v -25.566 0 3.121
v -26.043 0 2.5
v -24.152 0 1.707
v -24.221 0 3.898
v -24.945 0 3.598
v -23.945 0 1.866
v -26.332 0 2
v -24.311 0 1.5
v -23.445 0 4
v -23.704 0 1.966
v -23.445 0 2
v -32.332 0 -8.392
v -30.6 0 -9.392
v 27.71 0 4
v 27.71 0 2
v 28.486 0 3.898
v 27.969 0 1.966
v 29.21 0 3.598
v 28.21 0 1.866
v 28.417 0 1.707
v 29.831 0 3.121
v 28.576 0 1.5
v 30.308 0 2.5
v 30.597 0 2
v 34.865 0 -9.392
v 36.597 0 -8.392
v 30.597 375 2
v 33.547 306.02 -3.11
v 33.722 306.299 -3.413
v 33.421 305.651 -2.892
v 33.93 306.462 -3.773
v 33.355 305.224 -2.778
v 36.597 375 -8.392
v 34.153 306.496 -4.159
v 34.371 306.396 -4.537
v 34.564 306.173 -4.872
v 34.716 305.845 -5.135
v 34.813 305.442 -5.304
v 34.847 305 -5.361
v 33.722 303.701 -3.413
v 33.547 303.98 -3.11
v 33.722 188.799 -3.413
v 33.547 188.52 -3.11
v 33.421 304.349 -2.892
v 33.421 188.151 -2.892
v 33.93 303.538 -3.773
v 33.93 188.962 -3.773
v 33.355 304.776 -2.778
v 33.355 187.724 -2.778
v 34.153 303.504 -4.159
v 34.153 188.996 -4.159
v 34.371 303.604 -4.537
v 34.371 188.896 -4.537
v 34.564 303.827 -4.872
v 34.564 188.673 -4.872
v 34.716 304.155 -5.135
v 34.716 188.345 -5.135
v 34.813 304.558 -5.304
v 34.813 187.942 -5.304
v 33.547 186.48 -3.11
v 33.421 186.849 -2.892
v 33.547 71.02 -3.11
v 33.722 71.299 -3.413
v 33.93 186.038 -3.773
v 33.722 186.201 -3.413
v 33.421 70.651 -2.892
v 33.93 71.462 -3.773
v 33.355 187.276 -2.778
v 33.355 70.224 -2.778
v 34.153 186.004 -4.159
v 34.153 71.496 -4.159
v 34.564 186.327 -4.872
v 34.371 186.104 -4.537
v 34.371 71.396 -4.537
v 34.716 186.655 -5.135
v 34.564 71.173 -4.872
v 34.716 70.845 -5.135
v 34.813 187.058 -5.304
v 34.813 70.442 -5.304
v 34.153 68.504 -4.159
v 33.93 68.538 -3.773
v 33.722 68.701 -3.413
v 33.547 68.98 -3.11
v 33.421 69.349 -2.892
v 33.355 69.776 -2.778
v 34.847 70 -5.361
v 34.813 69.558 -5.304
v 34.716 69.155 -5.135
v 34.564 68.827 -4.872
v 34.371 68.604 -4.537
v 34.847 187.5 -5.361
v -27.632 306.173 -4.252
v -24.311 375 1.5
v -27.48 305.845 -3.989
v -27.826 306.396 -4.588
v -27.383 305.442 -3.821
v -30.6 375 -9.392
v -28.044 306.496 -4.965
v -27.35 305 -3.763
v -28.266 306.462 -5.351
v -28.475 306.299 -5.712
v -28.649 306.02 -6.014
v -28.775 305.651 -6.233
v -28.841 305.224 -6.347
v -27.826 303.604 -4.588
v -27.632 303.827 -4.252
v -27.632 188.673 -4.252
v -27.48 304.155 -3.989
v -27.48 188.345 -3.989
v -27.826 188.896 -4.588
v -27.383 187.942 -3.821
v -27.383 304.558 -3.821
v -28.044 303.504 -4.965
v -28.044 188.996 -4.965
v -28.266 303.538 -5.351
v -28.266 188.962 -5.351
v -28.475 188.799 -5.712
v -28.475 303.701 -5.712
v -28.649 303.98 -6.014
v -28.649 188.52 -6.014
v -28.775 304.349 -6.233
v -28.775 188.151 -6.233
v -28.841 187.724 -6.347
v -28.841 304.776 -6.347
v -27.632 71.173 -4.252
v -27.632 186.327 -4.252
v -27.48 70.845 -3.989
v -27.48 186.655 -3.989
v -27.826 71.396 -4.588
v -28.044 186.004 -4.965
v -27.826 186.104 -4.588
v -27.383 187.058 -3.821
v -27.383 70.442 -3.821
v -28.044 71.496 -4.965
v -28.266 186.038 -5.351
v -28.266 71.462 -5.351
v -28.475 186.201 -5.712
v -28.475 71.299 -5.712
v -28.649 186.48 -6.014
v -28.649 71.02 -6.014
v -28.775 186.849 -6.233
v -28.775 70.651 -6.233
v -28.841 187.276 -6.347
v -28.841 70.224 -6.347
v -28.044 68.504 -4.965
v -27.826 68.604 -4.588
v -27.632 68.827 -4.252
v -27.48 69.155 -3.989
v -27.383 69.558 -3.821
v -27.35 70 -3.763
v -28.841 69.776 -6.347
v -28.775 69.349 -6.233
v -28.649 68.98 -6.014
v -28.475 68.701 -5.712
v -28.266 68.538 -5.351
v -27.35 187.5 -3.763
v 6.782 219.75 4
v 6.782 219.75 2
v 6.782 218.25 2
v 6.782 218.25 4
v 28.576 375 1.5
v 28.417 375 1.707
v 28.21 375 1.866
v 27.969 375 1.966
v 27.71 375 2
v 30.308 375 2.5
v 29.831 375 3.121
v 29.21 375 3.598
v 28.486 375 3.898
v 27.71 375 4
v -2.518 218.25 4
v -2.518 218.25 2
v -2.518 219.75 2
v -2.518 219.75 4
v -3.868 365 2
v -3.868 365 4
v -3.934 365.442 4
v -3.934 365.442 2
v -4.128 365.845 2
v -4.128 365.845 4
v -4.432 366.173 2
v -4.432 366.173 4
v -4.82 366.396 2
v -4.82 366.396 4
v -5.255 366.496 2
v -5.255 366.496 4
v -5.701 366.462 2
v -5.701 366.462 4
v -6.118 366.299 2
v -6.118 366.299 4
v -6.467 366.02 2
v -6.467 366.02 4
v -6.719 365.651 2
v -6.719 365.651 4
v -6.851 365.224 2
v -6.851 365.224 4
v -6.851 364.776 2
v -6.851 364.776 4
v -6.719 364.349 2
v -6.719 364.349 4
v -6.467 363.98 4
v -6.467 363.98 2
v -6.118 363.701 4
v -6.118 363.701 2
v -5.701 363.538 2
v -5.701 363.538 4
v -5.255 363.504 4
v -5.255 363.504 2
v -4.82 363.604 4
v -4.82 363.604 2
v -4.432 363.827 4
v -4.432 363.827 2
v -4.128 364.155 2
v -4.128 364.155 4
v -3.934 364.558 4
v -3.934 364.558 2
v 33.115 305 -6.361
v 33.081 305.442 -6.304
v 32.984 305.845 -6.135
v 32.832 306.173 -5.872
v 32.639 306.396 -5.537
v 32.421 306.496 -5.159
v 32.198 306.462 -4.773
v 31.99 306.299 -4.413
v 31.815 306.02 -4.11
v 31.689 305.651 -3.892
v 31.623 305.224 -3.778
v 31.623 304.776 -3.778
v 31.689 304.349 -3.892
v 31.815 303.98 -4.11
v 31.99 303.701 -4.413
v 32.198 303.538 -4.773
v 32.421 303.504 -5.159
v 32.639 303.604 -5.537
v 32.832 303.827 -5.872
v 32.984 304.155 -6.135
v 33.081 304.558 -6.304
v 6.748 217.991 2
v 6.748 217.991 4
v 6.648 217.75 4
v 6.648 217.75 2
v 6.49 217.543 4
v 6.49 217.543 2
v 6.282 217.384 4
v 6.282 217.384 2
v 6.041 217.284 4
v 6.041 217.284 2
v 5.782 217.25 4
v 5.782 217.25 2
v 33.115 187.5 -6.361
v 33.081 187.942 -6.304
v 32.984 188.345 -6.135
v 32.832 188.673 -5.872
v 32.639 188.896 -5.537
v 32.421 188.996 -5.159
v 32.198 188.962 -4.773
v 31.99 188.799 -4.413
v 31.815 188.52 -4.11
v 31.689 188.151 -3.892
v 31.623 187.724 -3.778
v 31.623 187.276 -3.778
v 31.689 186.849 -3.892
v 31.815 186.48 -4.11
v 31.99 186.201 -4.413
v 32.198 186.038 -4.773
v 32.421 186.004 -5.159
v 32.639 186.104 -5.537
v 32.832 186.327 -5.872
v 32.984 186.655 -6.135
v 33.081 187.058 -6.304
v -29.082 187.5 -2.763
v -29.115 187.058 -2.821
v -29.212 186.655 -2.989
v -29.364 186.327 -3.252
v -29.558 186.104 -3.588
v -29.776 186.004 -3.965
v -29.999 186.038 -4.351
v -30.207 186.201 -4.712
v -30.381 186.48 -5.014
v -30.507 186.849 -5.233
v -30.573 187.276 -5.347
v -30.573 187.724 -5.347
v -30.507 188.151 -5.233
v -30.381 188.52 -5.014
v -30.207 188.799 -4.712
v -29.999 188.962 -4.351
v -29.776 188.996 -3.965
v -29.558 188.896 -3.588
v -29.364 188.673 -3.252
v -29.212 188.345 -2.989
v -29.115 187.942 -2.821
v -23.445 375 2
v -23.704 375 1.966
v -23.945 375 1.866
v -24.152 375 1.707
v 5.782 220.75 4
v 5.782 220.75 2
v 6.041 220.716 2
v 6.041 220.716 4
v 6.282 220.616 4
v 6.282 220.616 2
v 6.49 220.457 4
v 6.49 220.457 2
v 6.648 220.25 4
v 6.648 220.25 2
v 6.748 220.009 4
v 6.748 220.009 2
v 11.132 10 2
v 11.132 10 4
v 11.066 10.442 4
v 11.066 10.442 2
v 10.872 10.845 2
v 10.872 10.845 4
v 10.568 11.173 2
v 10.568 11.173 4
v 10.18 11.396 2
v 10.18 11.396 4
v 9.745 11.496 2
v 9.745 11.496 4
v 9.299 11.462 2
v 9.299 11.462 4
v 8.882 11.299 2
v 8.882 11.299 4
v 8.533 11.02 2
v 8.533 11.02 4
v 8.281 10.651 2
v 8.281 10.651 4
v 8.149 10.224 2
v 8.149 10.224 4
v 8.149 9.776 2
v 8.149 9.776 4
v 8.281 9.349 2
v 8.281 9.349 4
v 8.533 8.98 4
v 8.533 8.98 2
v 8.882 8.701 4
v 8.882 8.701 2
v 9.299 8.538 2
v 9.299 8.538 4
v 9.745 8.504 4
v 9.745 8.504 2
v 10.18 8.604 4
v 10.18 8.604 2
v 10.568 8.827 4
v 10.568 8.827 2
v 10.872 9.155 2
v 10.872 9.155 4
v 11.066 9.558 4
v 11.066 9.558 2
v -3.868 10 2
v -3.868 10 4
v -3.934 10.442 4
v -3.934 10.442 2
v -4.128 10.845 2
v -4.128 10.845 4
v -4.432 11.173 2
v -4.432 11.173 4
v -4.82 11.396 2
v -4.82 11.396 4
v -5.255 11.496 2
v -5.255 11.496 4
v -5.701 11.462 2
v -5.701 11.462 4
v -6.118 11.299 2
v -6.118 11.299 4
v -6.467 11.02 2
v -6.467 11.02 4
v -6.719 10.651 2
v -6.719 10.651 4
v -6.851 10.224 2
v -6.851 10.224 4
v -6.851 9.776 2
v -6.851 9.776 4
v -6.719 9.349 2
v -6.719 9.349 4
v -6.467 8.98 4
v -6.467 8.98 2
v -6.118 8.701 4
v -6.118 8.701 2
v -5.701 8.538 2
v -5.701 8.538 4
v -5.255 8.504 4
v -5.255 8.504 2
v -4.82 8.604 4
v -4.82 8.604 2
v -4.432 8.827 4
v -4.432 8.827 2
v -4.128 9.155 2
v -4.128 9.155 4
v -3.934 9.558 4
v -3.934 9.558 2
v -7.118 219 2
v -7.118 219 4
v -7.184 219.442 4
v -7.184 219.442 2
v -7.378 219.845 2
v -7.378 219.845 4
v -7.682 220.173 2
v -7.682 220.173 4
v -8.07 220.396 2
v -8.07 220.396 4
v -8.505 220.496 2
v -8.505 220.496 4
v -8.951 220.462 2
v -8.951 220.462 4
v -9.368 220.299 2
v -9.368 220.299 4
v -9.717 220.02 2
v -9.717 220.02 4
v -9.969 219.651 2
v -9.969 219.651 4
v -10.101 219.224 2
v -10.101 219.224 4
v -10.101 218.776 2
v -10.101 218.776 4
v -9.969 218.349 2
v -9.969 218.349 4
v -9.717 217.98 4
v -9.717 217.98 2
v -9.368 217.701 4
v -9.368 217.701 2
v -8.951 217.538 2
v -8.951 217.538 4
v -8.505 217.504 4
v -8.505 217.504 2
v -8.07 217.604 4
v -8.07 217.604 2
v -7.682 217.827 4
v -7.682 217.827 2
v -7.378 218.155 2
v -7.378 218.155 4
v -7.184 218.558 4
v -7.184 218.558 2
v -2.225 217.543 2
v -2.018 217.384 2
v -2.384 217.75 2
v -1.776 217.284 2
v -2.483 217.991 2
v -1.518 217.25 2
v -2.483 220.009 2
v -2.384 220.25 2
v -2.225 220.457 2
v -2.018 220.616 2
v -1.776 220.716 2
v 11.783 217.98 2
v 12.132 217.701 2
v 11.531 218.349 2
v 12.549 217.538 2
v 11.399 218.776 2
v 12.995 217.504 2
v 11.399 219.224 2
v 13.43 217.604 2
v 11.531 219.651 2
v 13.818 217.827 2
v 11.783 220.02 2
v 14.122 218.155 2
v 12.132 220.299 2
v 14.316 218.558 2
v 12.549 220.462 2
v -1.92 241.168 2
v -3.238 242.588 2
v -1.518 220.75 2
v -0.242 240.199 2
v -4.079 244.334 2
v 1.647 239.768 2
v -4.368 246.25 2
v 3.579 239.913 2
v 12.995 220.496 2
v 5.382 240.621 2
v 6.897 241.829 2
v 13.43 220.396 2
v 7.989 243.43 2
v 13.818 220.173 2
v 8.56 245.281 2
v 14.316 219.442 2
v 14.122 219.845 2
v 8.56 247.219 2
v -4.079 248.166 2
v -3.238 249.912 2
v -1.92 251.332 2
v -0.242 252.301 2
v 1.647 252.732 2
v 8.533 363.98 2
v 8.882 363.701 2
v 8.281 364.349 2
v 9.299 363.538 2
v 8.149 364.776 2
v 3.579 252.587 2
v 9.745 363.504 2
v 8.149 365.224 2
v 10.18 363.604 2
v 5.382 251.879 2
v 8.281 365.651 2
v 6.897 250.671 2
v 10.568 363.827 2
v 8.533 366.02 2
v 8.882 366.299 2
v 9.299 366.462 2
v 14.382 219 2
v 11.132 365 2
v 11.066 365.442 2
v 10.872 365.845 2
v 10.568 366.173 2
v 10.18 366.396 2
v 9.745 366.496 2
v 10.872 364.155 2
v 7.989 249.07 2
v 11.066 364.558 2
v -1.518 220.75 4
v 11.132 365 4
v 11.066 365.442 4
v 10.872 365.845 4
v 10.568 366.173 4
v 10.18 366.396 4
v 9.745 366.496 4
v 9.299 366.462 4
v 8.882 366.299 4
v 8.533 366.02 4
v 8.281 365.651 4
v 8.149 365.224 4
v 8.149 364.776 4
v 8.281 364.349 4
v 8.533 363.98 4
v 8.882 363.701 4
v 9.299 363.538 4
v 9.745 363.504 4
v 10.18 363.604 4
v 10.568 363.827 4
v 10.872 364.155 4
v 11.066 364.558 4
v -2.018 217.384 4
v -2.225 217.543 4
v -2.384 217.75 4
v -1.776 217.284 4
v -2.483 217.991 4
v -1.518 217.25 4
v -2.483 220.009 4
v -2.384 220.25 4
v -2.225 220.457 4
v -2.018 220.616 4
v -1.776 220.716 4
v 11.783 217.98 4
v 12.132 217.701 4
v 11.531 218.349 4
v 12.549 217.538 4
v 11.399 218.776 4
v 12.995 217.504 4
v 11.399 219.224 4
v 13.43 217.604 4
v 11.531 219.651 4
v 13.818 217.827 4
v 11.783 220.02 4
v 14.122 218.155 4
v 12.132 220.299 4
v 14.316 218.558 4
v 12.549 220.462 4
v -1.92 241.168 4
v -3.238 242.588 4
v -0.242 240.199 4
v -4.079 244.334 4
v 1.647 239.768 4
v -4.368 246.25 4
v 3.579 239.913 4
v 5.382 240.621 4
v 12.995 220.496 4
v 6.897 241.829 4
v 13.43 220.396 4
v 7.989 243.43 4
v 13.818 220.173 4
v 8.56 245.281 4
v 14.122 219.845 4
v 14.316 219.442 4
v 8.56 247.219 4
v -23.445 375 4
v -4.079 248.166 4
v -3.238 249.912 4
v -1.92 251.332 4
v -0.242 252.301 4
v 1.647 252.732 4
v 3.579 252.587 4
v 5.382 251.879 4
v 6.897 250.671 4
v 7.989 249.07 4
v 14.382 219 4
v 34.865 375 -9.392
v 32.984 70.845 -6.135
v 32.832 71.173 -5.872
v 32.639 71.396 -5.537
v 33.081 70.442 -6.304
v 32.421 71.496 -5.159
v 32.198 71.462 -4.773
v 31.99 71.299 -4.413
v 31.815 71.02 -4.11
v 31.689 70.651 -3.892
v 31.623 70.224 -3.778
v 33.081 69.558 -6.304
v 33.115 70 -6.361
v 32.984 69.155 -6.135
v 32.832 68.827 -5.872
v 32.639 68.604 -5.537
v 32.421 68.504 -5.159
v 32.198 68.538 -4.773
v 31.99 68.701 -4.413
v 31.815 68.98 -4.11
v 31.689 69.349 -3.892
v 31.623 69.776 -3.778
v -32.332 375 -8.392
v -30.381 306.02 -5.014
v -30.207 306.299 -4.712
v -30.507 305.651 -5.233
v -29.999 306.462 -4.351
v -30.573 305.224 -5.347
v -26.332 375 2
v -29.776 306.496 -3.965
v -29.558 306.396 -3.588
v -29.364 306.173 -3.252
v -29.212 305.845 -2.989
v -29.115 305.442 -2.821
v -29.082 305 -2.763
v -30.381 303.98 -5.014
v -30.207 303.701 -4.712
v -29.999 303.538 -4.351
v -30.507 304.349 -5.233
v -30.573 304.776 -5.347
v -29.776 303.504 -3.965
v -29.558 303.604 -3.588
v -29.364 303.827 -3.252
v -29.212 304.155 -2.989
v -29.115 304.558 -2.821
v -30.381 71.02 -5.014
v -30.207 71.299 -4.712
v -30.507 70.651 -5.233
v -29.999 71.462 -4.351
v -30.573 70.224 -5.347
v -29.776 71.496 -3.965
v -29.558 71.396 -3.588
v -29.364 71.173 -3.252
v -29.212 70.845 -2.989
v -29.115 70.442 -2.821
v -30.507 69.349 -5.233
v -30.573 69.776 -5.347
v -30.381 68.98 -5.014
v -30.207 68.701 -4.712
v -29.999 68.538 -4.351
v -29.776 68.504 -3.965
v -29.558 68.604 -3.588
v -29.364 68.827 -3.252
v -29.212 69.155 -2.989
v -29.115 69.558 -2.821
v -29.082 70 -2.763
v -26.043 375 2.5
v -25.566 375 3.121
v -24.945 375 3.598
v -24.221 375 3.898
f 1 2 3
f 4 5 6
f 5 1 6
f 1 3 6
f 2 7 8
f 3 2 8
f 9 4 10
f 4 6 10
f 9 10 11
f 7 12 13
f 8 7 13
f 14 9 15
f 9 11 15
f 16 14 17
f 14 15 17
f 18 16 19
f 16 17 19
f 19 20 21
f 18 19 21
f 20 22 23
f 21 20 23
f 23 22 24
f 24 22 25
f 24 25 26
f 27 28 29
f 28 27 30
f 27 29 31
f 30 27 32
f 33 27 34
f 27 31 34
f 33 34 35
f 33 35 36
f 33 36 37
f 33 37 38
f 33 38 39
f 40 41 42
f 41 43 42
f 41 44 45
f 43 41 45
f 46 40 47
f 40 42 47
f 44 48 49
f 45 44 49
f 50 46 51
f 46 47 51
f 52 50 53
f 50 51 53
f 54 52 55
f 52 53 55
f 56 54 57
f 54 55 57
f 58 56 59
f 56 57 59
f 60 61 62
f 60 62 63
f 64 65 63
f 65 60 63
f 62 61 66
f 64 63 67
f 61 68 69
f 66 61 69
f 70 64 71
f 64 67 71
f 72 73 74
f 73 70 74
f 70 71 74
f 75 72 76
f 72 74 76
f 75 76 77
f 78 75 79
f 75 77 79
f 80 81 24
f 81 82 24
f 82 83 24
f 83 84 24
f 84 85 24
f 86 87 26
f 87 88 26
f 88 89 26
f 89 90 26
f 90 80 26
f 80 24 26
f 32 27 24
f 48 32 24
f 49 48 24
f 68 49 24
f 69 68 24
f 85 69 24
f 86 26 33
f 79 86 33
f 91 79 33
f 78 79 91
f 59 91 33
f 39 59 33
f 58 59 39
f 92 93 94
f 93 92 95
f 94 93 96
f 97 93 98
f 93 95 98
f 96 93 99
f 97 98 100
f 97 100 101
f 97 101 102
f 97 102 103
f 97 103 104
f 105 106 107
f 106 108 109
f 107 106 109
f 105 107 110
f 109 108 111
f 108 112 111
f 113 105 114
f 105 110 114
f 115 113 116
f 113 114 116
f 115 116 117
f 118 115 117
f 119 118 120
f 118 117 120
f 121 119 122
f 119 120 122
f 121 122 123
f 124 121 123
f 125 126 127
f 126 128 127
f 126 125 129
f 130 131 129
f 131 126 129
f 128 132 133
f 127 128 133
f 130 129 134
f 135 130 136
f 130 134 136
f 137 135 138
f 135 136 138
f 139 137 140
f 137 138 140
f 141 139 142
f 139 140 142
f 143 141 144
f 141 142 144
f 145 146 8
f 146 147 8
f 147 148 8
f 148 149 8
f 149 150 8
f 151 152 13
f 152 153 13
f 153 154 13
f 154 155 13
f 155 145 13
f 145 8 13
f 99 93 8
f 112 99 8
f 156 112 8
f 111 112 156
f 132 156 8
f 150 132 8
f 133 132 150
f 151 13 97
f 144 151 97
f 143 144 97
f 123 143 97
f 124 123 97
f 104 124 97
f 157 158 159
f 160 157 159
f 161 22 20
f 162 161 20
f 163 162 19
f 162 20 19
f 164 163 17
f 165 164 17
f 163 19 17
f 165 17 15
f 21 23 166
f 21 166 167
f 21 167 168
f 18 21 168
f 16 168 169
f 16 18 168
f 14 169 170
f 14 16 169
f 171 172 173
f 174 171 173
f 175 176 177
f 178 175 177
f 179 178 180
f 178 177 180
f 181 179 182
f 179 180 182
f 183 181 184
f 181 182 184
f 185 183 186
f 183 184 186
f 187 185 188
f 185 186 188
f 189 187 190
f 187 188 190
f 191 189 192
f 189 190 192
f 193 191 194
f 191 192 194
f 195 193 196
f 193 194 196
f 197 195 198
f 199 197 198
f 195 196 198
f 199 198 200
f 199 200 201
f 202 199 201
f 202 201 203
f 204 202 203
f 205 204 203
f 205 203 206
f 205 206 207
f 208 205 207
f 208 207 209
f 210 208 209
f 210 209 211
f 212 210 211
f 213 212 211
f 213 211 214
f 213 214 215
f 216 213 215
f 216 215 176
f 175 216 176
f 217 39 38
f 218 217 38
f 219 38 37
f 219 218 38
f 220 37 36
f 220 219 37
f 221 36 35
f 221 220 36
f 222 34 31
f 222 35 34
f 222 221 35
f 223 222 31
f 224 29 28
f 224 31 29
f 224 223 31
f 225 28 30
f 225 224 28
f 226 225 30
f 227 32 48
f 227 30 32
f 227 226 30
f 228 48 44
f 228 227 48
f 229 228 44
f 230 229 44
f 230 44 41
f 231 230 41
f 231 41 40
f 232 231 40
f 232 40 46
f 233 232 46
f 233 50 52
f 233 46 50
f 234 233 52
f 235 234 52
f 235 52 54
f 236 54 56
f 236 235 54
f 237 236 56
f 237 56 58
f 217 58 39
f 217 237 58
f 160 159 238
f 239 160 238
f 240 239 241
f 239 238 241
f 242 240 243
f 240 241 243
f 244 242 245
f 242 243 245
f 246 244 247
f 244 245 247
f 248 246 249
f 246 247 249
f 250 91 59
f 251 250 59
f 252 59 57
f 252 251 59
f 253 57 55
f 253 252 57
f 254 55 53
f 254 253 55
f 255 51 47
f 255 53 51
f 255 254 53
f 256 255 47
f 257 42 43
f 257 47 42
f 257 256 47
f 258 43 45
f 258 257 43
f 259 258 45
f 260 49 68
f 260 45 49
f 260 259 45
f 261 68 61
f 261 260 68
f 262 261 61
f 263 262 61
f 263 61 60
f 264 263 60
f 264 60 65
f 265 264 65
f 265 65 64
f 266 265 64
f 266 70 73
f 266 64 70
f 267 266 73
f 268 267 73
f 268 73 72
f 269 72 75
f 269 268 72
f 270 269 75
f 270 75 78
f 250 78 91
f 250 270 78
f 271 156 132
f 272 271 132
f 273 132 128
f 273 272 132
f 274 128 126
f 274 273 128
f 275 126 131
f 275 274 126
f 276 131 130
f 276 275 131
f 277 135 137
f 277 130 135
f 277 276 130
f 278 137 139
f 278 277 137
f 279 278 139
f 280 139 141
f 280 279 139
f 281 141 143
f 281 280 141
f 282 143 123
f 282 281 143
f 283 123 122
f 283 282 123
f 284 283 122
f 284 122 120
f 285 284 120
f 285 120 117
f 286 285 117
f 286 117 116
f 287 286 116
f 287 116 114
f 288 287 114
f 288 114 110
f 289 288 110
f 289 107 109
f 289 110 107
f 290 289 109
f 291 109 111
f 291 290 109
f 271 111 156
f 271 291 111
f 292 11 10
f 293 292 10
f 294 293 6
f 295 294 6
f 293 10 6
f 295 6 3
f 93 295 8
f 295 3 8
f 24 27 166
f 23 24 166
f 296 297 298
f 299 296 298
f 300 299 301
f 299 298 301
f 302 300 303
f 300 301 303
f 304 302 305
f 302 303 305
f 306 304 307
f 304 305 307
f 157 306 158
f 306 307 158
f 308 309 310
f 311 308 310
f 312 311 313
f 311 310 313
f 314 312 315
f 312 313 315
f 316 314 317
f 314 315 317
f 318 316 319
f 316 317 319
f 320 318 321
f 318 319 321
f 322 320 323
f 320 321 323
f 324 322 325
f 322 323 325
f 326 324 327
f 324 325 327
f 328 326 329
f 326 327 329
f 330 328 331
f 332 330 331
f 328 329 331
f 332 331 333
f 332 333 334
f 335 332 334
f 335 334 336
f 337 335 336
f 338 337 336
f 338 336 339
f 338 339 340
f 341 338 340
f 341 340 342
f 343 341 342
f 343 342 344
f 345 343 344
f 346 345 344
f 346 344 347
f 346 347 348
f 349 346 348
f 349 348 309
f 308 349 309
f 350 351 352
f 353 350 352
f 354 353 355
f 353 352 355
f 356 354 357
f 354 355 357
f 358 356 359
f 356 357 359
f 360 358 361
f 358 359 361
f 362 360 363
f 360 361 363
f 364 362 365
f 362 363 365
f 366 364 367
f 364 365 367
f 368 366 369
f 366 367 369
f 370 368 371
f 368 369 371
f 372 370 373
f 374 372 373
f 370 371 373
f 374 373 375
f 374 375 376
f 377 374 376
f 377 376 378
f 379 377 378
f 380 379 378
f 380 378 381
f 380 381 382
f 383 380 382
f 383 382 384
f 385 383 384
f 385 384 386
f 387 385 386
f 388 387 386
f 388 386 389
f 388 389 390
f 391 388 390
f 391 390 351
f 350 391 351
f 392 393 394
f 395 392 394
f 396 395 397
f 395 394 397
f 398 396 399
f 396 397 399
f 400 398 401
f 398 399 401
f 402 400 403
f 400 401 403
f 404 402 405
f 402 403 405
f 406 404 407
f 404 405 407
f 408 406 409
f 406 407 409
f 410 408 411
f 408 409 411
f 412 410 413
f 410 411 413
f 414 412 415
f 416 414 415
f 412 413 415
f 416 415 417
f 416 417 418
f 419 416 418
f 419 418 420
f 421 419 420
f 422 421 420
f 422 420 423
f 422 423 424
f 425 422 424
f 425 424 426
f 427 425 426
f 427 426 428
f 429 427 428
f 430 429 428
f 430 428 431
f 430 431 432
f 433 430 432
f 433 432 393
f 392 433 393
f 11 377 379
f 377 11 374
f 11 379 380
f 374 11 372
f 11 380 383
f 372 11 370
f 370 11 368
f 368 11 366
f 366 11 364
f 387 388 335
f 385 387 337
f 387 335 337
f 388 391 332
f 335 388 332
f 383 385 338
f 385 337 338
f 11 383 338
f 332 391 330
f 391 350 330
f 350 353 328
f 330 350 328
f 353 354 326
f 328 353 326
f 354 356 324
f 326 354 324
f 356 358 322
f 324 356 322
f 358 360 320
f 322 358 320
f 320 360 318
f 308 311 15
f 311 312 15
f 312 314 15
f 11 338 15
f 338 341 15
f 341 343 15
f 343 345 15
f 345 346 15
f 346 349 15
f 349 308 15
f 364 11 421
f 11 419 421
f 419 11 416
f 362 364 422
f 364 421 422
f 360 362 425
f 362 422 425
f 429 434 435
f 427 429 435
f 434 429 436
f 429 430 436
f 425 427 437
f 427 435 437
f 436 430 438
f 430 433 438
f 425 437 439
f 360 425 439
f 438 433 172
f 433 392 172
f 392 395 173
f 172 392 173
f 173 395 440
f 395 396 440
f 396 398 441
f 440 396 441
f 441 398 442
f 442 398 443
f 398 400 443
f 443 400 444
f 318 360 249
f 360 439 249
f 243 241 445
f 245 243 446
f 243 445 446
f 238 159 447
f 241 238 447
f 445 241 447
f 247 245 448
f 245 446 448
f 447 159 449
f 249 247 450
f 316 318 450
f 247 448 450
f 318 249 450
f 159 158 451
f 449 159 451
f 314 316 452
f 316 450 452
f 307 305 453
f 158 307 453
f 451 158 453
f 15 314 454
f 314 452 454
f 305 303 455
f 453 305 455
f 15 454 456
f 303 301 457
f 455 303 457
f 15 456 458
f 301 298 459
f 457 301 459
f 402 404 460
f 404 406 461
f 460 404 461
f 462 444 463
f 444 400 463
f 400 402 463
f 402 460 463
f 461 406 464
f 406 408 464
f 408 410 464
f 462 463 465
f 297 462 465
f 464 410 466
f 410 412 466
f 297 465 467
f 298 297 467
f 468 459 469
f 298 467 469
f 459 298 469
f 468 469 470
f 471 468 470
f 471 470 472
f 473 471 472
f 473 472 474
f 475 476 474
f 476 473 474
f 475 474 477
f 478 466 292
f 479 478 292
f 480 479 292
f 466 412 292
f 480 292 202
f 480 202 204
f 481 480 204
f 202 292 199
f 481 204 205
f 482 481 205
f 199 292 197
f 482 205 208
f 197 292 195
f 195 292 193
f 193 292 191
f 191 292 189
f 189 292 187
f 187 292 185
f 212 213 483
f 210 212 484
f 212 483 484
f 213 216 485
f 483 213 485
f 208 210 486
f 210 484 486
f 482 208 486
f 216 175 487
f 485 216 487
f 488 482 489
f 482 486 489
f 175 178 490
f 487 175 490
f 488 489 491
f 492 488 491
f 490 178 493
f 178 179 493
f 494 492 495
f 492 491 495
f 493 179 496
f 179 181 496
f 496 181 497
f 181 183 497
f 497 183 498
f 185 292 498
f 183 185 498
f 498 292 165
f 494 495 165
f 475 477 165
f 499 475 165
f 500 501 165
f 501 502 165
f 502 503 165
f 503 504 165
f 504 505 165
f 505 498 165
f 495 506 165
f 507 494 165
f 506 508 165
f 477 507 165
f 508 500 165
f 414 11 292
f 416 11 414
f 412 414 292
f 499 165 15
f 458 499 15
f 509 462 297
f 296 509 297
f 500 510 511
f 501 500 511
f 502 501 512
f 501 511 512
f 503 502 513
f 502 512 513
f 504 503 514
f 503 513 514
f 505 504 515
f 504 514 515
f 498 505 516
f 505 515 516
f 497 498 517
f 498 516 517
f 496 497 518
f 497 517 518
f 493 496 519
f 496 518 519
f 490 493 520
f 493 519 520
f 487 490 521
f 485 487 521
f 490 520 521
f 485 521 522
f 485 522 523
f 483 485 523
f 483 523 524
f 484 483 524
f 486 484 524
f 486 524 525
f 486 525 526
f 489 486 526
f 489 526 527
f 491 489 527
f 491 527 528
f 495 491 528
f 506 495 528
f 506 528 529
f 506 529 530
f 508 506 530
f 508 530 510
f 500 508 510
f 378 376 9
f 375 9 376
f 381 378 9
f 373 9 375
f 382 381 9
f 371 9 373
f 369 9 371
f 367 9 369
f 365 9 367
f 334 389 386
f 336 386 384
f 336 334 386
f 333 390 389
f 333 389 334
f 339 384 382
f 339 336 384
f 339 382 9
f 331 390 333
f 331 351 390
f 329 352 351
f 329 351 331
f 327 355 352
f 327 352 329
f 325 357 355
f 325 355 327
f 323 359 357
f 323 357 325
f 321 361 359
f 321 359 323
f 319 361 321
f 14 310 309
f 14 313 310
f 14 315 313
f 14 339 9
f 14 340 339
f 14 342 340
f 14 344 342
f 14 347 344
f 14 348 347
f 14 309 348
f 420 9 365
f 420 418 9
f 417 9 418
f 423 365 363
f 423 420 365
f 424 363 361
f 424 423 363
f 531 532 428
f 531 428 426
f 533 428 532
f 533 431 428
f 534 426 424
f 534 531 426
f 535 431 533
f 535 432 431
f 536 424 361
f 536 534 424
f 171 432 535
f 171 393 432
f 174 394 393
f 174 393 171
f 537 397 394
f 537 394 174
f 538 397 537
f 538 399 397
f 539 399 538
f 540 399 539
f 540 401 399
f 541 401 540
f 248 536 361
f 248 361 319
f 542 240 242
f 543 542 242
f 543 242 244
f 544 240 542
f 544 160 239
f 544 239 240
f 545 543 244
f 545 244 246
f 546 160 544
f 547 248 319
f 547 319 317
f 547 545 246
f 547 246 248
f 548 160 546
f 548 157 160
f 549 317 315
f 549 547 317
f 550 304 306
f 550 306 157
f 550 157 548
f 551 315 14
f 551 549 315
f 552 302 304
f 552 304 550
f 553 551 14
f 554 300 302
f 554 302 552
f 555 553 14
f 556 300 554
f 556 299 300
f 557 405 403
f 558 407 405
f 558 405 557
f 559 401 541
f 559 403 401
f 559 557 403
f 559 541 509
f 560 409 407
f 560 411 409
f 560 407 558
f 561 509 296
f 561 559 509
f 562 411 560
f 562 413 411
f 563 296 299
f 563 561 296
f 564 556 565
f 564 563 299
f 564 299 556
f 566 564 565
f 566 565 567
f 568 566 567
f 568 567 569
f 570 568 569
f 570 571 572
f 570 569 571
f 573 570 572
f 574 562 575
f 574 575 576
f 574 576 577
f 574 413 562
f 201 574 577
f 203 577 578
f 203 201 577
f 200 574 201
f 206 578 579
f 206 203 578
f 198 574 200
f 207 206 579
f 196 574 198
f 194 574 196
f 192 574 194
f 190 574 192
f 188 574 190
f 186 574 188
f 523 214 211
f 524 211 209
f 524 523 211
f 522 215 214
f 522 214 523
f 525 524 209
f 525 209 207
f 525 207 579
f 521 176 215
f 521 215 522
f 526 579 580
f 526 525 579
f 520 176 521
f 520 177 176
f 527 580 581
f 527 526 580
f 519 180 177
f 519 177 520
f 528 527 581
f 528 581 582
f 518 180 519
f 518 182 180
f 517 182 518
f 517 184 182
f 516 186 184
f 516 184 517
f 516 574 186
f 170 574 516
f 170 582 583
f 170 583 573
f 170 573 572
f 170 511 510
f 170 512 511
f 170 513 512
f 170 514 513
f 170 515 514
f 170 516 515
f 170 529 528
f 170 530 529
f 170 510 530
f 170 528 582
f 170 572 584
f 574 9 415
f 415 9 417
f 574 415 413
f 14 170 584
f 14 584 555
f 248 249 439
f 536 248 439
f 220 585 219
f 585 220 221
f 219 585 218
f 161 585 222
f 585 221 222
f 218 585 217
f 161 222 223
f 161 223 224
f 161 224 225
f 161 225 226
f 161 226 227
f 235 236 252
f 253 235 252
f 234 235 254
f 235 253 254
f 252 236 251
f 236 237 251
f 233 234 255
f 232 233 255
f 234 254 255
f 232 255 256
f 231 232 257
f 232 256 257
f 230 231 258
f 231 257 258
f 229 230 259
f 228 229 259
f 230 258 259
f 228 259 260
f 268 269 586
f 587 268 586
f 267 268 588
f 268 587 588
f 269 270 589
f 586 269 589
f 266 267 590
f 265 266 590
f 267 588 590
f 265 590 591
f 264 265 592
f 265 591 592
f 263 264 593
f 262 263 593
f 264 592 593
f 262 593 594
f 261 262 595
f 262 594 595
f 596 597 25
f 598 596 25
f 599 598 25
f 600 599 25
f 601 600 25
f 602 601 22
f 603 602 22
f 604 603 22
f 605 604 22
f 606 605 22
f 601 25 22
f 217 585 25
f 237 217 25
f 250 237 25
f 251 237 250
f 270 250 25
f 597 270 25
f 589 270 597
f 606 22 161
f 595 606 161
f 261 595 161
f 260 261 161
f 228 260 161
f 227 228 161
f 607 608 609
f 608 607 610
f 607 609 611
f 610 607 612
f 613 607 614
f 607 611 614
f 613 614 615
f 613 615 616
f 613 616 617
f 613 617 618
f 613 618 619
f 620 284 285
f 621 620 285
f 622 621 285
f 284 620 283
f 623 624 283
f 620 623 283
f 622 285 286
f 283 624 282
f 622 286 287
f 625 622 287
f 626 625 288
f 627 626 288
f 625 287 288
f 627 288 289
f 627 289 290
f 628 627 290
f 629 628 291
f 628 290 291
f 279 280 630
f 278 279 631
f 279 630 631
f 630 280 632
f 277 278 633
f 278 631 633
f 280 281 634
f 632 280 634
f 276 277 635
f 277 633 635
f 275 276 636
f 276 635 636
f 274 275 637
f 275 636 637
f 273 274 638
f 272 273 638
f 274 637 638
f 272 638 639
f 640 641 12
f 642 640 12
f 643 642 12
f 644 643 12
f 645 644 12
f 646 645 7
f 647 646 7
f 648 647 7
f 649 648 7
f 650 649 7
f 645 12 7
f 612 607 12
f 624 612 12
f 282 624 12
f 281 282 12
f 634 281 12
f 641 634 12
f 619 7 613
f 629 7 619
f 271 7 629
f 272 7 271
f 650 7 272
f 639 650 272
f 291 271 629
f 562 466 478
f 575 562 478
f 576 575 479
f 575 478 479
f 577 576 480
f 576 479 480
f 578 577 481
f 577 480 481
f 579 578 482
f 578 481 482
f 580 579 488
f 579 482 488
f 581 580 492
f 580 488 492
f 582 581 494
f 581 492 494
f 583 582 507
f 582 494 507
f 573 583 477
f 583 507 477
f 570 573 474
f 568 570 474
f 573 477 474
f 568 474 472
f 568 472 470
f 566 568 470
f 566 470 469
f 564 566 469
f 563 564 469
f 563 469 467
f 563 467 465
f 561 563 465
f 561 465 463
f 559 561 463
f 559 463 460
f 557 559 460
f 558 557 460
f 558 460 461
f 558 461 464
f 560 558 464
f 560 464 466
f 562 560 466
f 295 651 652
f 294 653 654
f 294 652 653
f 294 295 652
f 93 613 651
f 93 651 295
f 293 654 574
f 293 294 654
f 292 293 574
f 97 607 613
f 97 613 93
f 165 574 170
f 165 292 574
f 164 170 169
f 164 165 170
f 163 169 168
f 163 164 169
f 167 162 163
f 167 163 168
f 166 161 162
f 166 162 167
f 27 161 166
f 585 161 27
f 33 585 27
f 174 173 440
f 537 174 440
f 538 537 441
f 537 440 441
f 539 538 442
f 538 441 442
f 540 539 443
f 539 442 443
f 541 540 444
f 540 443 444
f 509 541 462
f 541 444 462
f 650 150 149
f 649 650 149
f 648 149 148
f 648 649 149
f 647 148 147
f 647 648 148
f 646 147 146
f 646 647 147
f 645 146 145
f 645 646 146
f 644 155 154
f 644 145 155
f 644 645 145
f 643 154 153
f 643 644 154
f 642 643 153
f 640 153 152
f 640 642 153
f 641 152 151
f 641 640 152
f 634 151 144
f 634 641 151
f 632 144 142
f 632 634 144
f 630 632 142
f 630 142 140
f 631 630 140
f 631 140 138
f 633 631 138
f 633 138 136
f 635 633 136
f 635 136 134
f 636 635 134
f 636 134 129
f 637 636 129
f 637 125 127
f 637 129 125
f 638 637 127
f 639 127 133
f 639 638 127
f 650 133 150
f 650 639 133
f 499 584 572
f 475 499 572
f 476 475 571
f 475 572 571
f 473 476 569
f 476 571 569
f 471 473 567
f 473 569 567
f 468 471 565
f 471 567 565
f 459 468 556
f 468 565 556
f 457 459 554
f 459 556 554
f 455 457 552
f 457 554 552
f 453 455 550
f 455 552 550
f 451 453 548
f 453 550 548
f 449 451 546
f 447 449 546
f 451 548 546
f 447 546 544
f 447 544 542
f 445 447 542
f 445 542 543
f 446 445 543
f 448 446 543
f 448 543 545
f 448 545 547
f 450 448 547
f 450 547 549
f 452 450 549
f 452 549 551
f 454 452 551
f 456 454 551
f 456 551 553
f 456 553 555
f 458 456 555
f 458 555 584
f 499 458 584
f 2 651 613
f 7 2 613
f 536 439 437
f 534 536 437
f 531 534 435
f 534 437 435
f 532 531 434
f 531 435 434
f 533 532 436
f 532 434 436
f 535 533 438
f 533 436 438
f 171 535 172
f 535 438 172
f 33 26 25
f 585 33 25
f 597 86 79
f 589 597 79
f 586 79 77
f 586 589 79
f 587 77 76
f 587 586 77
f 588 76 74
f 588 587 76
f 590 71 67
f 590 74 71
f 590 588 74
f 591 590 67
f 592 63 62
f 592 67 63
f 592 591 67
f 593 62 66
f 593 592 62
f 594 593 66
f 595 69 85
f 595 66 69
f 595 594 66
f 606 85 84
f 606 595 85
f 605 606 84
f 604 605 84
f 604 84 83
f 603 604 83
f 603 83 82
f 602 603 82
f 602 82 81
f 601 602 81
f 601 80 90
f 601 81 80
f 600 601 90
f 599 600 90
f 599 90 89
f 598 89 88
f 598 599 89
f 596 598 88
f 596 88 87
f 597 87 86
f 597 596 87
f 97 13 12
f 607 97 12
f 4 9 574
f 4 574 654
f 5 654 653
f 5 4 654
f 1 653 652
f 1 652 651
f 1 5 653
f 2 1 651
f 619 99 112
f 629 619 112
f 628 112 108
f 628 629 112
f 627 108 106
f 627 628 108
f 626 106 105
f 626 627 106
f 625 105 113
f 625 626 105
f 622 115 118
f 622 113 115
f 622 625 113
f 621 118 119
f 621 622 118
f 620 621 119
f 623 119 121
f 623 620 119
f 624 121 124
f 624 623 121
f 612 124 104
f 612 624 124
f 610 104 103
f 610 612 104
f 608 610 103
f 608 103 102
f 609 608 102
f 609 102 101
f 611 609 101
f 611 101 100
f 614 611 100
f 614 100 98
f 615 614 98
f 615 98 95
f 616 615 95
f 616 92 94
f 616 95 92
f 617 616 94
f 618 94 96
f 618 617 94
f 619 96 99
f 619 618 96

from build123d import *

# Parameters (mm, degrees)
SKETCH_11_W             = 80.498191281
SKETCH_11_H             = 375
SM_BASE_FLANGE_1_DEPTH  = 2
CUT_EXTRUDE_1_DEPTH     = 378.392627604
HOLE_WIZARD_3_0_3_1_D   = 3
HOLE_WIZARD_3_0_3_2_D   = 3
HOLE_WIZARD_13_0_13_1_D = 13
OTHER_1_DEPTH           = 375
OTHER_1_2_DEPTH         = 375
OTHER_START             = -25
OTHER_1_3_OUTLINE_R     = 1.5
OTHER_1_3_DEPTH         = 4
OTHER_START_2           = 33.158957521
OTHER_3_OUTLINE_R       = 1.5
OTHER_3_DEPTH           = 6.841042479
OTHER_3_2_DEPTH         = 375
OTHER_3_3_DEPTH         = 375
OTHER_START_3           = 24
OTHER_3_4_OUTLINE_R     = 1.5
OTHER_3_4_DEPTH         = 4


with BuildPart() as part:
    # 基材-凸緣1: sheet metal written as solids
    # 草圖11 → 基材-凸緣1 (new body)
    with BuildSketch(Plane.XY.offset(4)):
        with Locations((2.132449513, 187.5)):
            Rectangle(SKETCH_11_W, SKETCH_11_H)
    extrude(amount=-SM_BASE_FLANGE_1_DEPTH)

    # 草圖16 → 除料-伸長1 (cut, through all)
    with BuildSketch(Plane(origin=(0, 0, 2), x_dir=(-1, 0, 0), z_dir=(0, 0, -1))):
        with BuildLine():
            Line((1.517550486, 220.75), (-5.782449514, 220.75))
            ThreePointArc((-5.782449514, 220.75), (-6.489556295, 220.457106781), (-6.782449514, 219.75))
            Line((-6.782449514, 219.75), (-6.782449514, 218.25))
            ThreePointArc((-6.782449514, 218.25), (-6.489556295, 217.542893219), (-5.782449514, 217.25))
            Line((-5.782449514, 217.25), (1.517550486, 217.25))
            ThreePointArc((1.517550486, 217.25), (2.224657268, 217.542893219), (2.517550486, 218.25))
            Line((2.517550486, 218.25), (2.517550486, 219.75))
            ThreePointArc((2.517550486, 219.75), (2.224657268, 220.457106781), (1.517550486, 220.75))
        make_face()
    extrude(amount=-CUT_EXTRUDE_1_DEPTH, mode=Mode.SUBTRACT)

    # Ø3.0 (3) 直徑孔1 (through all)
    with Locations(Plane.XY.offset(4)):
        with Locations((37.381545154, 70), (37.381545154, 187.5), (37.381545154, 305), (-33.116646127, 70), (-33.116646127, 187.5), (-33.116646127, 305)):
            Hole(HOLE_WIZARD_3_0_3_1_D / 2)

    # Ø3.0 (3) 直徑孔2 (through all)
    with Locations(Plane(origin=(0, 0, 2), x_dir=(-1, 0, 0), z_dir=(0, 0, -1))):
        with Locations((-12.882449514, 219), (8.617550486, 219), (5.367550486, 10), (-9.632449514, 10), (-9.632449514, 365), (5.367550486, 365)):
            Hole(HOLE_WIZARD_3_0_3_2_D / 2)

    # Ø13.0 (13) 直徑孔1 (through all)
    with Locations(Plane.XY.offset(4)):
        with Locations((2.132449514, 246.25)):
            Hole(HOLE_WIZARD_13_0_13_1_D / 2)

    # Other 1: read off the stored shape, not the designer's step
    # Other 1 outline → Other 1 (cut)
    with BuildSketch(Plane(origin=(0, 0, 0), x_dir=(1, 0, 0), z_dir=(0, 1, 0))):
        with BuildLine():
            Line((-26.042976967, -2.5), (-26.331652102, -2))
            Line((-26.331652102, -2), (-38.116646127, -2))
            Line((-38.116646127, -2), (-38.116646127, -4))
            Line((-38.116646127, -4), (-23.444900756, -4))
            ThreePointArc((-23.444900756, -4), (-24.944900756, -3.598076211), (-26.042976967, -2.5))
        make_face()
    extrude(amount=OTHER_1_DEPTH, mode=Mode.SUBTRACT)

    # Other 1 2 outline → Other 1 2 (add)
    with BuildSketch(Plane(origin=(0, 0, 0), x_dir=(1, 0, 0), z_dir=(0, 1, 0))):
        with BuildLine():
            Line((-30.599601294, 9.392304845), (-32.331652102, 8.392304845))
            Line((-32.331652102, 8.392304845), (-26.331652102, -2))
            Line((-26.331652102, -2), (-23.444900756, -2))
            ThreePointArc((-23.444900756, -2), (-23.944900756, -1.866025404), (-24.310926159, -1.5))
            Line((-24.310926159, -1.5), (-30.599601294, 9.392304845))
        make_face()
    extrude(amount=OTHER_1_2_DEPTH)

    # Other 1 3 outline → Other 1 3 (cut)
    with BuildSketch(Plane(origin=(0, 0, 0), x_dir=(0.4999999999999988, 0, 0.8660254037844395), z_dir=(0.8660254037844393, 0, -0.4999999999999991)).offset(OTHER_START)):
        with Locations((-18.433775243, -305)):
            Circle(OTHER_1_3_OUTLINE_R)
        with Locations((-18.433775243, -187.5)):
            Circle(OTHER_1_3_OUTLINE_R)
        with Locations((-18.433775243, -70)):
            Circle(OTHER_1_3_OUTLINE_R)
    extrude(amount=OTHER_1_3_DEPTH, mode=Mode.SUBTRACT)

    # Other 3: read off the stored shape, not the designer's step
    # Other 3 outline → Other 3 (cut)
    with BuildSketch(Plane(origin=(0, 0, 0), x_dir=(0.500000000000006, 0, -0.8660254037844353), z_dir=(0.8660254037844352, 0, 0.5000000000000061)).offset(OTHER_START_2)):
        with Locations((20.566224757, 70)):
            Circle(OTHER_3_OUTLINE_R)
        with Locations((20.566224757, 187.5)):
            Circle(OTHER_3_OUTLINE_R)
        with Locations((20.566224757, 305)):
            Circle(OTHER_3_OUTLINE_R)
    extrude(amount=OTHER_3_DEPTH, mode=Mode.SUBTRACT)

    # Other 3 2 outline → Other 3 2 (cut)
    with BuildSketch(Plane(origin=(0, 0, 0), x_dir=(1, 0, 0), z_dir=(0, 1, 0))):
        with BuildLine():
            Line((42.381545154, -2), (30.596551129, -2))
            Line((30.596551129, -2), (30.307875994, -2.5))
            ThreePointArc((30.307875994, -2.5), (29.209799783, -3.598076211), (27.709799783, -4))
            Line((27.709799783, -4), (42.381545154, -4))
            Line((42.381545154, -4), (42.381545154, -2))
        make_face()
    extrude(amount=OTHER_3_2_DEPTH, mode=Mode.SUBTRACT)

    # Other 3 3 outline → Other 3 3 (add)
    with BuildSketch(Plane(origin=(0, 0, 0), x_dir=(1, 0, 0), z_dir=(0, 1, 0))):
        with BuildLine():
            Line((34.864500321, 9.392304845), (28.575825186, -1.5))
            ThreePointArc((28.575825186, -1.5), (28.209799783, -1.866025404), (27.709799783, -2))
            Line((27.709799783, -2), (30.596551129, -2))
            Line((30.596551129, -2), (36.596551129, 8.392304845))
            Line((36.596551129, 8.392304845), (34.864500321, 9.392304845))
        make_face()
    extrude(amount=OTHER_3_3_DEPTH)

    # Other 3 4 outline → Other 3 4 (cut)
    with BuildSketch(Plane(origin=(0, 0, 0), x_dir=(0.500000000000006, 0, -0.8660254037844353), z_dir=(0.8660254037844352, 0, 0.5000000000000061)).offset(OTHER_START_3)):
        with Locations((20.566224757, 70)):
            Circle(OTHER_3_4_OUTLINE_R)
        with Locations((20.566224757, 187.5)):
            Circle(OTHER_3_4_OUTLINE_R)
        with Locations((20.566224757, 305)):
            Circle(OTHER_3_4_OUTLINE_R)
    extrude(amount=OTHER_3_4_DEPTH, mode=Mode.SUBTRACT)


solid = part.part
